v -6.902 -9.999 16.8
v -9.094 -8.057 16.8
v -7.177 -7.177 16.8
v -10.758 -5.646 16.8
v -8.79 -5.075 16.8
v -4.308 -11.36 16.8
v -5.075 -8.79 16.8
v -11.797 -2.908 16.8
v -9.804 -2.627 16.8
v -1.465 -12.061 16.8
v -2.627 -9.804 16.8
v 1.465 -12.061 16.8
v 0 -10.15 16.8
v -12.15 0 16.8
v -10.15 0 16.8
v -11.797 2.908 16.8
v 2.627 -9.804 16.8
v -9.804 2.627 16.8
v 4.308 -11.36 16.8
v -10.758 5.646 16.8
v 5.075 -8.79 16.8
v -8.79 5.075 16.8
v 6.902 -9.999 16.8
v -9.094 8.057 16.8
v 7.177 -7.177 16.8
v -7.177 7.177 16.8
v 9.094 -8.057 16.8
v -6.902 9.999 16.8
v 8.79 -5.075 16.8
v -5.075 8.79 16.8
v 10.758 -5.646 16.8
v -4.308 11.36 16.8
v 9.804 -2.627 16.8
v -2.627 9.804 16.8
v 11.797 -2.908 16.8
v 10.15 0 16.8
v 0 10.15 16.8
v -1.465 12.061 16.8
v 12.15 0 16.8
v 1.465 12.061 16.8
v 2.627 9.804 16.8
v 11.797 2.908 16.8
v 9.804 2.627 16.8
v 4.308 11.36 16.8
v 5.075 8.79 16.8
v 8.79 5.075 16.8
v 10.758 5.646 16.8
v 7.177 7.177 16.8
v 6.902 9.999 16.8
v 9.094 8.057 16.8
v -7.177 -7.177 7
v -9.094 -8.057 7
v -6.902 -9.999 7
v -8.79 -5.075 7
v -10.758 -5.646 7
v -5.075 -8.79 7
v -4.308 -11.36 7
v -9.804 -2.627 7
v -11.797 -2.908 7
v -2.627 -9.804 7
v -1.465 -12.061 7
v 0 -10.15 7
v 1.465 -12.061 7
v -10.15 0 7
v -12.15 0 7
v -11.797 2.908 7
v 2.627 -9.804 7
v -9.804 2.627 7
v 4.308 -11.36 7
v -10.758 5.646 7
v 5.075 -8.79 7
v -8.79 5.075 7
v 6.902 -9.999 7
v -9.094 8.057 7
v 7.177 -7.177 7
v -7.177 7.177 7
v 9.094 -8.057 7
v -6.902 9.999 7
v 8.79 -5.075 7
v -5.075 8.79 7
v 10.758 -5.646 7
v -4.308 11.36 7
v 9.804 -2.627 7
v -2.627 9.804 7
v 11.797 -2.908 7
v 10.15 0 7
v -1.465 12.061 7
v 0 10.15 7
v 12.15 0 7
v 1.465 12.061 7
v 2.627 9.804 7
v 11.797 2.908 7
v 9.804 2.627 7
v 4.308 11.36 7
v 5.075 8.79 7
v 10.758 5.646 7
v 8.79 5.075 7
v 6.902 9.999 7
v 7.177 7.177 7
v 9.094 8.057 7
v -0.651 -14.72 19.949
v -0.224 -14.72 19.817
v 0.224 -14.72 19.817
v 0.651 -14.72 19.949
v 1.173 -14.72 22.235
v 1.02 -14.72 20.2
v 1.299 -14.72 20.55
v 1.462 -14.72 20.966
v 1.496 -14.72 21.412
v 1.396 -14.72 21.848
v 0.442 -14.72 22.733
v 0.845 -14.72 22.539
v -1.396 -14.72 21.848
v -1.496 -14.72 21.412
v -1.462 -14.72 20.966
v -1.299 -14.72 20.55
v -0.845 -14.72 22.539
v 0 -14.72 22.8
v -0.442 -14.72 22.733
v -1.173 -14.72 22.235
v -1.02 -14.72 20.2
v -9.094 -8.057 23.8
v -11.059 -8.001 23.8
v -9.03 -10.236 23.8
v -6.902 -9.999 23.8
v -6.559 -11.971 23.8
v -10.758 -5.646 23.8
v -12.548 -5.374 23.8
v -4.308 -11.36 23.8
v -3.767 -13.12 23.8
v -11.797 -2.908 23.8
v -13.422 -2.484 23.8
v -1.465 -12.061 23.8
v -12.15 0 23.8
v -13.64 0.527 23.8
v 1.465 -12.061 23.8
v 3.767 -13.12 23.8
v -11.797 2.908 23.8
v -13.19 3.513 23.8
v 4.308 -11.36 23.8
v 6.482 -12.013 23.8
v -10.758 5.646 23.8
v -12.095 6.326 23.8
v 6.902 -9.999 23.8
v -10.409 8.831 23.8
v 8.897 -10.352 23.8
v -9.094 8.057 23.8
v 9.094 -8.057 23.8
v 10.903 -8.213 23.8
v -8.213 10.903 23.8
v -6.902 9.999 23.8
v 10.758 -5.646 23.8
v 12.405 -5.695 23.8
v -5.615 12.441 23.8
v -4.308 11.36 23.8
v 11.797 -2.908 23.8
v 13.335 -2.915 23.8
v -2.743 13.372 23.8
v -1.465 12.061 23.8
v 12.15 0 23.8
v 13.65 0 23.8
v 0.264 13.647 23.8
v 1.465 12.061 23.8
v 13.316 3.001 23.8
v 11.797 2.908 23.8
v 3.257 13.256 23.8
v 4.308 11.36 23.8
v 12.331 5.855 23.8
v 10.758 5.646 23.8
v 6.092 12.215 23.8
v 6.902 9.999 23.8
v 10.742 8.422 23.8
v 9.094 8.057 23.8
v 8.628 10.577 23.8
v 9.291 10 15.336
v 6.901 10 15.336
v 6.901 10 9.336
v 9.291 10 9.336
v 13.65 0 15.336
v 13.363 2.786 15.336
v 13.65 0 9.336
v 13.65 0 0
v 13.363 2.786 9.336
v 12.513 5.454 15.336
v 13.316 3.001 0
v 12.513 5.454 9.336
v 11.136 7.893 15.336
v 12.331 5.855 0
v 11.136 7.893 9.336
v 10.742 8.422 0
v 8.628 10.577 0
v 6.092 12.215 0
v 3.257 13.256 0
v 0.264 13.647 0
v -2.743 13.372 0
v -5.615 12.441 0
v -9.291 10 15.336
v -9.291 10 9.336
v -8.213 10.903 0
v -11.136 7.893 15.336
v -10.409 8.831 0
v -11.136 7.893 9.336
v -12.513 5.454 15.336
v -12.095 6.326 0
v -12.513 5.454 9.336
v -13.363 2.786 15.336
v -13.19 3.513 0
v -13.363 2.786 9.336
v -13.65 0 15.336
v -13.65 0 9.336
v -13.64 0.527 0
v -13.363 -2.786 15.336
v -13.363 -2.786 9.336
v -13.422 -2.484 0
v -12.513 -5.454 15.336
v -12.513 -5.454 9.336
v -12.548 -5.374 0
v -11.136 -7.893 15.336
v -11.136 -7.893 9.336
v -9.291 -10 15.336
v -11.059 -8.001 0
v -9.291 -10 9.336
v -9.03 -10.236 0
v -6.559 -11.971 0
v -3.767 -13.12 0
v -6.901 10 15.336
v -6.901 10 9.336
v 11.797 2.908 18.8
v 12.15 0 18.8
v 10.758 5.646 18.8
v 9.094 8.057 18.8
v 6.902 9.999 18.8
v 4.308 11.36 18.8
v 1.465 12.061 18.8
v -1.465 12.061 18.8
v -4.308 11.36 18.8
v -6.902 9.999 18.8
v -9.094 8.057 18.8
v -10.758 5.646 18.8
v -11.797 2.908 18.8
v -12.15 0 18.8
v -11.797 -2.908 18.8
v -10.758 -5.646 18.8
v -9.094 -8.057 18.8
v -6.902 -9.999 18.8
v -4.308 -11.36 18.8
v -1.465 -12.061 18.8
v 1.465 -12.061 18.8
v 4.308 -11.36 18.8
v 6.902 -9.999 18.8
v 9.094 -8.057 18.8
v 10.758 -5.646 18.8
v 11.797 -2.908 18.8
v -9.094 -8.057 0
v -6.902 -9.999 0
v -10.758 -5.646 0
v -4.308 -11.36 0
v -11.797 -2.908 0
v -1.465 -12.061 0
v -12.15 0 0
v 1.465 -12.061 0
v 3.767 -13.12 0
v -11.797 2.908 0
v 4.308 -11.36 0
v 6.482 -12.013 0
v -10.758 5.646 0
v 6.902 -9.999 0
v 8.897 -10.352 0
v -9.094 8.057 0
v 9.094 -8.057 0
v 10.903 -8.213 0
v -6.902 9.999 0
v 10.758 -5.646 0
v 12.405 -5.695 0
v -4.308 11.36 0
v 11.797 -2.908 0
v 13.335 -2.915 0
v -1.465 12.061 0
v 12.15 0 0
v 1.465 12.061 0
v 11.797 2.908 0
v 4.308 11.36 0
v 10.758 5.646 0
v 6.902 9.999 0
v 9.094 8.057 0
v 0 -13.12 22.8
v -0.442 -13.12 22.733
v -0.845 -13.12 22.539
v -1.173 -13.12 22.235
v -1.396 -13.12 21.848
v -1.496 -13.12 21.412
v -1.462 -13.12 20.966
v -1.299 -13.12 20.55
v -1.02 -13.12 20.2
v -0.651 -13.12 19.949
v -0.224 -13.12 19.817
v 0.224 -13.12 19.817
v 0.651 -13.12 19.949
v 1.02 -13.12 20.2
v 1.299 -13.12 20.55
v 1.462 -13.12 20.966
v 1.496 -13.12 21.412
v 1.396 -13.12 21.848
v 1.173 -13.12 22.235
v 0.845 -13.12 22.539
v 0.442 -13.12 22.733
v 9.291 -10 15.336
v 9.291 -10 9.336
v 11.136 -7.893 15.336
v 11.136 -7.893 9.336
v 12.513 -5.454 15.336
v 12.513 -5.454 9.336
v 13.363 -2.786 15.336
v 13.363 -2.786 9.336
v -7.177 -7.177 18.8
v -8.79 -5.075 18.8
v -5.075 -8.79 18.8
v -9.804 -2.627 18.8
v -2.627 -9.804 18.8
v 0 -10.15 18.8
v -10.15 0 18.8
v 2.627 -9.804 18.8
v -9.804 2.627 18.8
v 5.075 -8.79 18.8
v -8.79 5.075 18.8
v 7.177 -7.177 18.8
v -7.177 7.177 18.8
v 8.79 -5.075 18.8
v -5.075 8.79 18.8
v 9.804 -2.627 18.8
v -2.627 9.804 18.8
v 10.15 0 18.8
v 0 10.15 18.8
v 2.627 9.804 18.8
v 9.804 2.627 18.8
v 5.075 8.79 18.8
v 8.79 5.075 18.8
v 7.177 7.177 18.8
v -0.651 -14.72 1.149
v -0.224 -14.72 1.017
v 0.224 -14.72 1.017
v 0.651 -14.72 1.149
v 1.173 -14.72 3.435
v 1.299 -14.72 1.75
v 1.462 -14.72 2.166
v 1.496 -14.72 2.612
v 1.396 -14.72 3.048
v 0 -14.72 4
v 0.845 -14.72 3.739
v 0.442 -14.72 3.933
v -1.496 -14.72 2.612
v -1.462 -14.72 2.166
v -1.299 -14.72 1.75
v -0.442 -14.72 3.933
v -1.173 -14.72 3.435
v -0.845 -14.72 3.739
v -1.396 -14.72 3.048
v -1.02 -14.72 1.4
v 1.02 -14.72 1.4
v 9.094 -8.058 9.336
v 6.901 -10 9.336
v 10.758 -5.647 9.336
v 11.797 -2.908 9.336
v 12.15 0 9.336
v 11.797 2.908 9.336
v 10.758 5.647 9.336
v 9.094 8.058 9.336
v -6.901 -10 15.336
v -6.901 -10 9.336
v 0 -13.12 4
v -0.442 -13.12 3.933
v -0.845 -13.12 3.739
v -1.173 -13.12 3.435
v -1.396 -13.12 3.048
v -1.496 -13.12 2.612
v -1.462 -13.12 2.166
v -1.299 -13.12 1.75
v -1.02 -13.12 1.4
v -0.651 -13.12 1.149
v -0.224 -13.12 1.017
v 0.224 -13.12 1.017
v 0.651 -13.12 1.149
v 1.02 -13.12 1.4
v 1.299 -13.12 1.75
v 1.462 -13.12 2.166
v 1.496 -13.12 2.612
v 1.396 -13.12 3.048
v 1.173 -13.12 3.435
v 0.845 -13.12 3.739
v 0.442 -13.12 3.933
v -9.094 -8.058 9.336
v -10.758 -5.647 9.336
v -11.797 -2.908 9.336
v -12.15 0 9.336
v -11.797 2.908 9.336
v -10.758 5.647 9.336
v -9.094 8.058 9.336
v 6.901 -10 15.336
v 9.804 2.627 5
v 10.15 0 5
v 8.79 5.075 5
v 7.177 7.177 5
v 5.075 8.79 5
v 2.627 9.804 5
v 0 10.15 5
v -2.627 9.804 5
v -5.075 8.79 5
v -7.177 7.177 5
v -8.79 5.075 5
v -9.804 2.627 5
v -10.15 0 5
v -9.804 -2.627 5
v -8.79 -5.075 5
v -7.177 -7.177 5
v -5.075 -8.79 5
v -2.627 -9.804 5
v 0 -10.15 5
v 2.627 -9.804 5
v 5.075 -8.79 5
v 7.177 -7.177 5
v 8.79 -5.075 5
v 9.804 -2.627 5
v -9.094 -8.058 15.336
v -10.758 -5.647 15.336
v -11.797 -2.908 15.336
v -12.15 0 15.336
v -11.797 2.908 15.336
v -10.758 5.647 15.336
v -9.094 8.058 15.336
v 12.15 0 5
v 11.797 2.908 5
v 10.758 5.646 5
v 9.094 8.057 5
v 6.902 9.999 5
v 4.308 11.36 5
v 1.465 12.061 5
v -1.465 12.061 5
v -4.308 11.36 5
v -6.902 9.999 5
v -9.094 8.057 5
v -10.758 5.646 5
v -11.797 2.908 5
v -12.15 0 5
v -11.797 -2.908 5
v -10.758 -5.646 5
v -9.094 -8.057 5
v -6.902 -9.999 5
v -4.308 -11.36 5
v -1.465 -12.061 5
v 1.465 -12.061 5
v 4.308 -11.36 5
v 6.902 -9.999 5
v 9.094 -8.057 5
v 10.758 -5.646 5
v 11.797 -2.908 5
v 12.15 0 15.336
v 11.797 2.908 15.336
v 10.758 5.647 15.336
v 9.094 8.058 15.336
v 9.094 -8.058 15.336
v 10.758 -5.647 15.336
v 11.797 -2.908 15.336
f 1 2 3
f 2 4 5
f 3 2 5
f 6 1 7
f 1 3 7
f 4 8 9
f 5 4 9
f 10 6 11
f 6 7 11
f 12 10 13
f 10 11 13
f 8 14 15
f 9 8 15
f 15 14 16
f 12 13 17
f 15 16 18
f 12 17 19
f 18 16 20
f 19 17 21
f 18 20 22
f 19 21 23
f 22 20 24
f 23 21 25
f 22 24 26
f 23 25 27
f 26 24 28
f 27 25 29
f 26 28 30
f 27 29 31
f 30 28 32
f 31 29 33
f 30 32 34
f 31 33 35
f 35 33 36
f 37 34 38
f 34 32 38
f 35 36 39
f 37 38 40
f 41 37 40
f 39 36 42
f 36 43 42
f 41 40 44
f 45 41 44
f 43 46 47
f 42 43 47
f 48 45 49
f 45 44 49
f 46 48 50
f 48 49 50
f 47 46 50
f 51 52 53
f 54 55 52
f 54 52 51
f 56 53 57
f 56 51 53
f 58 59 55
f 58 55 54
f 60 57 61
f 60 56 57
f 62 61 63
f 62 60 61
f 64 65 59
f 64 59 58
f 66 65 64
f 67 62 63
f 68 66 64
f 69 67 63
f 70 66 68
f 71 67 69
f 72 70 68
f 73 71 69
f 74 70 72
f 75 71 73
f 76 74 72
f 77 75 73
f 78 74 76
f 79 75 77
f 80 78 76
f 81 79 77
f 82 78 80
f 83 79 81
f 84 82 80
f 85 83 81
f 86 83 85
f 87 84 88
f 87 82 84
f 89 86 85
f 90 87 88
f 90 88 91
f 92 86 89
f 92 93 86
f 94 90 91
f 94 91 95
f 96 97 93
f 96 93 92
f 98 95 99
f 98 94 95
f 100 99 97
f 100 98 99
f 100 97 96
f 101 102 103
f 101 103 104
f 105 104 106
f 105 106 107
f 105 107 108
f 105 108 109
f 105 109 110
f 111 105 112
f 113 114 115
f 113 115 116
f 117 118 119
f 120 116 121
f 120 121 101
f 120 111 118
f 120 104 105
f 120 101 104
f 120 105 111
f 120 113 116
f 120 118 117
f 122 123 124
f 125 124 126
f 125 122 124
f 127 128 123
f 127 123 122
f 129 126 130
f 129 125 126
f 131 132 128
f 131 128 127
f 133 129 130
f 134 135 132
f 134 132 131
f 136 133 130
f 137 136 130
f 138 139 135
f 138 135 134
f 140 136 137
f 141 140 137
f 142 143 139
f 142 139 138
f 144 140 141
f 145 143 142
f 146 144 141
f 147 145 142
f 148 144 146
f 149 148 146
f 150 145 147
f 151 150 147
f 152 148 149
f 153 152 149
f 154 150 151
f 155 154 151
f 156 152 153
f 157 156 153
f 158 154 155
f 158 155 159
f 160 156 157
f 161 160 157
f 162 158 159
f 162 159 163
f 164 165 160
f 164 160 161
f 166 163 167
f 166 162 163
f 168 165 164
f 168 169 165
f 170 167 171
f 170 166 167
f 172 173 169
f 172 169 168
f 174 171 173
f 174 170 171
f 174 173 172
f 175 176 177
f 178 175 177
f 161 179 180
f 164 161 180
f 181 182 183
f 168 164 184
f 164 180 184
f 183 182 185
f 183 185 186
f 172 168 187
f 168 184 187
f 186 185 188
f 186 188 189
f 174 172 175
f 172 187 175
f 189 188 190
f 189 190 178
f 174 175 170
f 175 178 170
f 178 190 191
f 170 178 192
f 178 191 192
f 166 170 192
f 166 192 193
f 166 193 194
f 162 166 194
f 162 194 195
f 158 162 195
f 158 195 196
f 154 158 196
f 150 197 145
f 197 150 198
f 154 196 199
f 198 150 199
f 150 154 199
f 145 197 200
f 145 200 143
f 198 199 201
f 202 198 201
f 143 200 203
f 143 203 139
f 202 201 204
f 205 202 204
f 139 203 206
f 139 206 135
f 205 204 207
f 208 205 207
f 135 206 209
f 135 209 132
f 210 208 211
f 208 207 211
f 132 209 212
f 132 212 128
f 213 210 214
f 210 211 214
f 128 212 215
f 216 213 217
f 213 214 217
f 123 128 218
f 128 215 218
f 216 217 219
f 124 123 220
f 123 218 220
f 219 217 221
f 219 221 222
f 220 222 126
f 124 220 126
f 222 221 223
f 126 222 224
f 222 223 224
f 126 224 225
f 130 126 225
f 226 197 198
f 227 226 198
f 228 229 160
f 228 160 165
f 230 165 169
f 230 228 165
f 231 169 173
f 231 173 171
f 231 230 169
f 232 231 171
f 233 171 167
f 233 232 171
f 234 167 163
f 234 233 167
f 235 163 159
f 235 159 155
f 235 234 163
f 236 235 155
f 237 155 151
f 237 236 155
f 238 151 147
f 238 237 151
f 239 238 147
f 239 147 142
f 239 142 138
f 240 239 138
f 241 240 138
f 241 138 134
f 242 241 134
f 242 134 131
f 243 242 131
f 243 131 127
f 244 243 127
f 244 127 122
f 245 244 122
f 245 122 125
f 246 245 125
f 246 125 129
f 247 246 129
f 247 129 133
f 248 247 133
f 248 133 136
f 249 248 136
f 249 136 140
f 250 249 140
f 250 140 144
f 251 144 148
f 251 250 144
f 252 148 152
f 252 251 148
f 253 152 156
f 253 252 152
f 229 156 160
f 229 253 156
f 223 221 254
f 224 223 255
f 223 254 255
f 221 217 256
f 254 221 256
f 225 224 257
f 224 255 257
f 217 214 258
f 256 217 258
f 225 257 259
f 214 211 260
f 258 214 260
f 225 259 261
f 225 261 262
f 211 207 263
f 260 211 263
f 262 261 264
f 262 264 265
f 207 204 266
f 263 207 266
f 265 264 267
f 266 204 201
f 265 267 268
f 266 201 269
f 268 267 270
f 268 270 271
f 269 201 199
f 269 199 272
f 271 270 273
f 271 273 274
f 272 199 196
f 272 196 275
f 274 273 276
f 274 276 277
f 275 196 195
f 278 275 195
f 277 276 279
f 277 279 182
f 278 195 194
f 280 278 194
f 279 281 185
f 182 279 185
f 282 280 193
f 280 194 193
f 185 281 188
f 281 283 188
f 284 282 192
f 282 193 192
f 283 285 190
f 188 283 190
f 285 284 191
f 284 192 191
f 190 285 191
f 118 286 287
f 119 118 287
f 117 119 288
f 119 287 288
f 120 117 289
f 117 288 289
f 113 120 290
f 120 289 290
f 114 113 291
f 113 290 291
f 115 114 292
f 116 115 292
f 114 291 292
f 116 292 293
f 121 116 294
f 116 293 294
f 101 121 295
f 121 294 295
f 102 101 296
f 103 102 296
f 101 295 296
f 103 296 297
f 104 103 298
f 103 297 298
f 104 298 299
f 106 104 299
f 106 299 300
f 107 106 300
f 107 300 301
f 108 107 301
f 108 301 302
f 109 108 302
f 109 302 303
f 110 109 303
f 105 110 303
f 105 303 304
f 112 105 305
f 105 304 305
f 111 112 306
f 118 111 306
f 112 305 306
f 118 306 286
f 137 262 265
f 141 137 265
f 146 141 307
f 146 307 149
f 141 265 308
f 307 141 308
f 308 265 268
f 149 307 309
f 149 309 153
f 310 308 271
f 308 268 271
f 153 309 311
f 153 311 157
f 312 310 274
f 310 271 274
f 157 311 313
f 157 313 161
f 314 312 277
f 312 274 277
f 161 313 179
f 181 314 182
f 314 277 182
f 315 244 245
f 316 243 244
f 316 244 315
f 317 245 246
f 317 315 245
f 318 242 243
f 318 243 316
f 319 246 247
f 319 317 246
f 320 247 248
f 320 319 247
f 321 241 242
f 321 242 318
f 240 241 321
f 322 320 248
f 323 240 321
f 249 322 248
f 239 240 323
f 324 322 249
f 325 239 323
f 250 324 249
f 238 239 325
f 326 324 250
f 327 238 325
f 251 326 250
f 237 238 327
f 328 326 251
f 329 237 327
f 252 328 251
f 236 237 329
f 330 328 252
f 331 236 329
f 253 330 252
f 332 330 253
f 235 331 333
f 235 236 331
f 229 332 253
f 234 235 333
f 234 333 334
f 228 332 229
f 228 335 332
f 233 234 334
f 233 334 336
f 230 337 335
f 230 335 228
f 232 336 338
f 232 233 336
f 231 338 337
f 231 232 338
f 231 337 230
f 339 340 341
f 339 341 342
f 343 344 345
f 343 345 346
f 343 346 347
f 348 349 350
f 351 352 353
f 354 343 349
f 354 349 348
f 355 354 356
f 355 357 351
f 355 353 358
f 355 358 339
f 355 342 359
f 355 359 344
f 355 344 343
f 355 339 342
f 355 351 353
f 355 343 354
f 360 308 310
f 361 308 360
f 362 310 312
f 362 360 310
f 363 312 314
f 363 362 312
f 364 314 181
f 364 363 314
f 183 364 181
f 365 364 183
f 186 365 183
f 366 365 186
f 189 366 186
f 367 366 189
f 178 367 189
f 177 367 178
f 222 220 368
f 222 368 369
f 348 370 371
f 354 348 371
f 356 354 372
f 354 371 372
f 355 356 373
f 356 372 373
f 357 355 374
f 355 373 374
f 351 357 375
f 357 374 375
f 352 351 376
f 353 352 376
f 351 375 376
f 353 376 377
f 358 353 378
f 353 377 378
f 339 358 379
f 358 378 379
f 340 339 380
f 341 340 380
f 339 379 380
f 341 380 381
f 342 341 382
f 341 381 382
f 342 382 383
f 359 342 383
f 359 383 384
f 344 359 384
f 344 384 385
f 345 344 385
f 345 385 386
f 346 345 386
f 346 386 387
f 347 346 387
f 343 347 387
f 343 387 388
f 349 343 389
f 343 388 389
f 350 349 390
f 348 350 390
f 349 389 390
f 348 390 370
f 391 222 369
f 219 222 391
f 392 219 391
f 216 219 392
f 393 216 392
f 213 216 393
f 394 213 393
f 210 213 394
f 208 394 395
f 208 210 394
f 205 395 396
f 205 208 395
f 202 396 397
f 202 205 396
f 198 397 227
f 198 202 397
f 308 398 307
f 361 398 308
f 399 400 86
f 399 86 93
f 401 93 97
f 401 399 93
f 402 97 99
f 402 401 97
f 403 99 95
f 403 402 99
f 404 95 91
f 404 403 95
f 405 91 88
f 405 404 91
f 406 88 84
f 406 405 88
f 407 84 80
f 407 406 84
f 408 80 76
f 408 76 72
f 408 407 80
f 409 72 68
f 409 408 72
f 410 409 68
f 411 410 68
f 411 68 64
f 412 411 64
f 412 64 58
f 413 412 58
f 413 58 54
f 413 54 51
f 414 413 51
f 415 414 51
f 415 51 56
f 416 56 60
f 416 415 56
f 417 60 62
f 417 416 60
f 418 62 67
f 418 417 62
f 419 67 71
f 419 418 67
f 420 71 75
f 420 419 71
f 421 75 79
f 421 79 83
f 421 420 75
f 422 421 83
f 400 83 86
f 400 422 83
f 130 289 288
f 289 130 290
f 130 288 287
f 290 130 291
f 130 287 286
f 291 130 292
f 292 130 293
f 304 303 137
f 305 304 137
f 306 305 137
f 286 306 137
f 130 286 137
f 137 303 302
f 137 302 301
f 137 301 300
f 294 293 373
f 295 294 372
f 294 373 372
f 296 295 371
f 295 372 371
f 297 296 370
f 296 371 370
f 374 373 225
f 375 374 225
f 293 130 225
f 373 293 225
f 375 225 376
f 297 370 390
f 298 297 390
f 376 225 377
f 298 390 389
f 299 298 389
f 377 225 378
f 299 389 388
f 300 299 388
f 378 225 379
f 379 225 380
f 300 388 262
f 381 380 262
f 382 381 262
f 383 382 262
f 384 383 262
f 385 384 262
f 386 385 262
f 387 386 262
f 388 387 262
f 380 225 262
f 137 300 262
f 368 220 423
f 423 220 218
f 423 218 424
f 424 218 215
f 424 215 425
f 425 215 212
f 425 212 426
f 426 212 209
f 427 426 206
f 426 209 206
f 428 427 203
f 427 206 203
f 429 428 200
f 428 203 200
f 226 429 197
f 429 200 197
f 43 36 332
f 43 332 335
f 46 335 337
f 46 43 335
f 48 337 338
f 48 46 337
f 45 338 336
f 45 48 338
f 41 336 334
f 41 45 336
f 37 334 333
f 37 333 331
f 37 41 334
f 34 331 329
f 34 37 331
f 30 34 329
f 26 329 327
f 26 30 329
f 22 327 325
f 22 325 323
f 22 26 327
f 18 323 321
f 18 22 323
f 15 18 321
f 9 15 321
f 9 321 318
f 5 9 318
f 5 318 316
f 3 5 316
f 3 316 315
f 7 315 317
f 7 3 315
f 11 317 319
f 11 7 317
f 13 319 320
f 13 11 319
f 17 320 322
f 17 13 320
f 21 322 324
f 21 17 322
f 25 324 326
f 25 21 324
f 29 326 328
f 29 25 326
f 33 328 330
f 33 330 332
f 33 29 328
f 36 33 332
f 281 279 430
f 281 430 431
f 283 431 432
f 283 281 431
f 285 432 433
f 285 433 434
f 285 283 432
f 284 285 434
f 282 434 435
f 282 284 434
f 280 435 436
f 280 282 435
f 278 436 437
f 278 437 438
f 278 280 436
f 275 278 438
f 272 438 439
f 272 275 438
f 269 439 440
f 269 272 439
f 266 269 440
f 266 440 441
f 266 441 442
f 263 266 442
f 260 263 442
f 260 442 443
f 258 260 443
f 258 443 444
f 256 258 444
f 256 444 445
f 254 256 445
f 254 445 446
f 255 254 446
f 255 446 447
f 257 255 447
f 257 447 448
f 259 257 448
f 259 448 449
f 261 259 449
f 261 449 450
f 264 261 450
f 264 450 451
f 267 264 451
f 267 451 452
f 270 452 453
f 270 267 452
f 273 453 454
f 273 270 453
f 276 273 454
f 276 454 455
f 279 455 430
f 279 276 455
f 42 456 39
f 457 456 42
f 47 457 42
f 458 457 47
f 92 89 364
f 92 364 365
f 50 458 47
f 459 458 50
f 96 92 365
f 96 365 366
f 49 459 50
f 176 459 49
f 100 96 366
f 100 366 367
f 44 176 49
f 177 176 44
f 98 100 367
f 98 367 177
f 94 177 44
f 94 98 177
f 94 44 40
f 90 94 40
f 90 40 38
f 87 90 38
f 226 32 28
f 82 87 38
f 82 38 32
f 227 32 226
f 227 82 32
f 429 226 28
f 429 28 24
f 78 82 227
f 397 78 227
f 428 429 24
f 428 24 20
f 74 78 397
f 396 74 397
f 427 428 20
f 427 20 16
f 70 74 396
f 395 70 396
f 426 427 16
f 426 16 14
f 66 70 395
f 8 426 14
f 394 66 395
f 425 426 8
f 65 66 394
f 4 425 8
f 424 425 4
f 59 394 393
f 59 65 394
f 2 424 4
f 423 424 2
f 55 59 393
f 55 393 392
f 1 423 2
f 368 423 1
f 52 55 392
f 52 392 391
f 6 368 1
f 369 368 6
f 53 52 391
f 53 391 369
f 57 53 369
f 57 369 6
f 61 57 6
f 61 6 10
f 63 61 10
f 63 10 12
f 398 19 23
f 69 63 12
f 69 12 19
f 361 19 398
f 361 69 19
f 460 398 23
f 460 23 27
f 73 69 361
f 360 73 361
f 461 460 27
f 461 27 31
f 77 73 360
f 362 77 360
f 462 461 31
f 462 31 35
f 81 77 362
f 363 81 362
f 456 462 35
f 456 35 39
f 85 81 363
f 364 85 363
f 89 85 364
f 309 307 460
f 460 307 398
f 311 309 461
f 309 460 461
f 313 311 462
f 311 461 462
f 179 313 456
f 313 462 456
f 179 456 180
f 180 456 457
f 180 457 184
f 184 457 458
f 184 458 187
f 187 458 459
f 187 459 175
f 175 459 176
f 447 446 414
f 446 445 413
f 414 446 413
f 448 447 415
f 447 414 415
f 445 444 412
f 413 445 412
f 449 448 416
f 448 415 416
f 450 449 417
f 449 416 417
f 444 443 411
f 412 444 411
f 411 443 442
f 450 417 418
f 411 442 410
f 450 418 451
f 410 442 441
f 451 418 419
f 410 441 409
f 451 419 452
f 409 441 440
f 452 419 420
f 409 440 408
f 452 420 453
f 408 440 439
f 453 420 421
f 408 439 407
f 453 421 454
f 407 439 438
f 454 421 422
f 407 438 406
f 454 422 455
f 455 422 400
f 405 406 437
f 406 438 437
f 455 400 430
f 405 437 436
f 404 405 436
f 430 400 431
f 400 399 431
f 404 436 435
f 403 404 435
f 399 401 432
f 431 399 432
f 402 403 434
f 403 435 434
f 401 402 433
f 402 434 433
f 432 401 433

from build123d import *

# Parameters (mm, degrees)
SKETCH1_R               = 12.15
BOSS_EXTRUDE1_DEPTH     = 23.8
BOSS_EXTRUDE2_START     = -7
SKETCH2_R               = 12.15
SKETCH2_R_2             = 10.15
BOSS_EXTRUDE2_DEPTH     = 2
BOSS_EXTRUDE3_START     = -18.8
SKETCH2_2_R             = 12.15
SKETCH2_2_R_2           = 10.15
BOSS_EXTRUDE3_DEPTH     = 2
CUT_EXTRUDE1_DEPTH      = 31.644493796
CUT_EXTRUDE1_DEPTH_BACK = 31.644493796
SKETCH4_W               = 6
SKETCH4_H               = 20
SKETCH5_R               = 1.5
BOSS_EXTRUDE4_DEPTH     = 1.6


with BuildPart() as part:
    # Sketch1 → Boss-Extrude1 (new body)
    with BuildSketch(Plane.XY):
        with BuildLine():
            ThreePointArc((13.65, 0), (-8.213005423, 10.902708009), (-3.766709439, -13.12))
            Line((-3.766709439, -13.12), (3.766709439, -13.12))
            ThreePointArc((3.766709439, -13.12), (10.902708009, -8.213005423), (13.65, 0))
        make_face()
        Circle(SKETCH1_R, mode=Mode.SUBTRACT)
    extrude(amount=BOSS_EXTRUDE1_DEPTH)

    # Sketch2 → Boss-Extrude2 (add)
    with BuildSketch(Plane.XY.offset(23.8).offset(BOSS_EXTRUDE2_START)):
        Circle(SKETCH2_R)
        Circle(SKETCH2_R_2, mode=Mode.SUBTRACT)
    extrude(amount=BOSS_EXTRUDE2_DEPTH)

    # Sketch2<2> → Boss-Extrude3 (add)
    with BuildSketch(Plane.XY.offset(23.8).offset(BOSS_EXTRUDE3_START)):
        Circle(SKETCH2_2_R)
        Circle(SKETCH2_2_R_2, mode=Mode.SUBTRACT)
    extrude(amount=BOSS_EXTRUDE3_DEPTH)

    # Sketch4 → Cut-Extrude1 (cut, two sides: drawn at the far end of the back side and taken through both)
    with BuildSketch(Plane(origin=(0, 0, 0), x_dir=(0, 0, -1), z_dir=(1, 0, 0)).offset(-CUT_EXTRUDE1_DEPTH_BACK)):
        with Locations((-12.335754997, 0)):
            Rectangle(SKETCH4_W, SKETCH4_H)
    extrude(amount=CUT_EXTRUDE1_DEPTH + CUT_EXTRUDE1_DEPTH_BACK, mode=Mode.SUBTRACT)

    # Sketch5 → Boss-Extrude4 (add)
    with BuildSketch(Plane.XZ.offset(13.12)):
        with Locations((0, 21.3)):
            Circle(SKETCH5_R)
        with Locations((0, 2.5)):
            Circle(SKETCH5_R)
    extrude(amount=BOSS_EXTRUDE4_DEPTH)


solid = part.part
